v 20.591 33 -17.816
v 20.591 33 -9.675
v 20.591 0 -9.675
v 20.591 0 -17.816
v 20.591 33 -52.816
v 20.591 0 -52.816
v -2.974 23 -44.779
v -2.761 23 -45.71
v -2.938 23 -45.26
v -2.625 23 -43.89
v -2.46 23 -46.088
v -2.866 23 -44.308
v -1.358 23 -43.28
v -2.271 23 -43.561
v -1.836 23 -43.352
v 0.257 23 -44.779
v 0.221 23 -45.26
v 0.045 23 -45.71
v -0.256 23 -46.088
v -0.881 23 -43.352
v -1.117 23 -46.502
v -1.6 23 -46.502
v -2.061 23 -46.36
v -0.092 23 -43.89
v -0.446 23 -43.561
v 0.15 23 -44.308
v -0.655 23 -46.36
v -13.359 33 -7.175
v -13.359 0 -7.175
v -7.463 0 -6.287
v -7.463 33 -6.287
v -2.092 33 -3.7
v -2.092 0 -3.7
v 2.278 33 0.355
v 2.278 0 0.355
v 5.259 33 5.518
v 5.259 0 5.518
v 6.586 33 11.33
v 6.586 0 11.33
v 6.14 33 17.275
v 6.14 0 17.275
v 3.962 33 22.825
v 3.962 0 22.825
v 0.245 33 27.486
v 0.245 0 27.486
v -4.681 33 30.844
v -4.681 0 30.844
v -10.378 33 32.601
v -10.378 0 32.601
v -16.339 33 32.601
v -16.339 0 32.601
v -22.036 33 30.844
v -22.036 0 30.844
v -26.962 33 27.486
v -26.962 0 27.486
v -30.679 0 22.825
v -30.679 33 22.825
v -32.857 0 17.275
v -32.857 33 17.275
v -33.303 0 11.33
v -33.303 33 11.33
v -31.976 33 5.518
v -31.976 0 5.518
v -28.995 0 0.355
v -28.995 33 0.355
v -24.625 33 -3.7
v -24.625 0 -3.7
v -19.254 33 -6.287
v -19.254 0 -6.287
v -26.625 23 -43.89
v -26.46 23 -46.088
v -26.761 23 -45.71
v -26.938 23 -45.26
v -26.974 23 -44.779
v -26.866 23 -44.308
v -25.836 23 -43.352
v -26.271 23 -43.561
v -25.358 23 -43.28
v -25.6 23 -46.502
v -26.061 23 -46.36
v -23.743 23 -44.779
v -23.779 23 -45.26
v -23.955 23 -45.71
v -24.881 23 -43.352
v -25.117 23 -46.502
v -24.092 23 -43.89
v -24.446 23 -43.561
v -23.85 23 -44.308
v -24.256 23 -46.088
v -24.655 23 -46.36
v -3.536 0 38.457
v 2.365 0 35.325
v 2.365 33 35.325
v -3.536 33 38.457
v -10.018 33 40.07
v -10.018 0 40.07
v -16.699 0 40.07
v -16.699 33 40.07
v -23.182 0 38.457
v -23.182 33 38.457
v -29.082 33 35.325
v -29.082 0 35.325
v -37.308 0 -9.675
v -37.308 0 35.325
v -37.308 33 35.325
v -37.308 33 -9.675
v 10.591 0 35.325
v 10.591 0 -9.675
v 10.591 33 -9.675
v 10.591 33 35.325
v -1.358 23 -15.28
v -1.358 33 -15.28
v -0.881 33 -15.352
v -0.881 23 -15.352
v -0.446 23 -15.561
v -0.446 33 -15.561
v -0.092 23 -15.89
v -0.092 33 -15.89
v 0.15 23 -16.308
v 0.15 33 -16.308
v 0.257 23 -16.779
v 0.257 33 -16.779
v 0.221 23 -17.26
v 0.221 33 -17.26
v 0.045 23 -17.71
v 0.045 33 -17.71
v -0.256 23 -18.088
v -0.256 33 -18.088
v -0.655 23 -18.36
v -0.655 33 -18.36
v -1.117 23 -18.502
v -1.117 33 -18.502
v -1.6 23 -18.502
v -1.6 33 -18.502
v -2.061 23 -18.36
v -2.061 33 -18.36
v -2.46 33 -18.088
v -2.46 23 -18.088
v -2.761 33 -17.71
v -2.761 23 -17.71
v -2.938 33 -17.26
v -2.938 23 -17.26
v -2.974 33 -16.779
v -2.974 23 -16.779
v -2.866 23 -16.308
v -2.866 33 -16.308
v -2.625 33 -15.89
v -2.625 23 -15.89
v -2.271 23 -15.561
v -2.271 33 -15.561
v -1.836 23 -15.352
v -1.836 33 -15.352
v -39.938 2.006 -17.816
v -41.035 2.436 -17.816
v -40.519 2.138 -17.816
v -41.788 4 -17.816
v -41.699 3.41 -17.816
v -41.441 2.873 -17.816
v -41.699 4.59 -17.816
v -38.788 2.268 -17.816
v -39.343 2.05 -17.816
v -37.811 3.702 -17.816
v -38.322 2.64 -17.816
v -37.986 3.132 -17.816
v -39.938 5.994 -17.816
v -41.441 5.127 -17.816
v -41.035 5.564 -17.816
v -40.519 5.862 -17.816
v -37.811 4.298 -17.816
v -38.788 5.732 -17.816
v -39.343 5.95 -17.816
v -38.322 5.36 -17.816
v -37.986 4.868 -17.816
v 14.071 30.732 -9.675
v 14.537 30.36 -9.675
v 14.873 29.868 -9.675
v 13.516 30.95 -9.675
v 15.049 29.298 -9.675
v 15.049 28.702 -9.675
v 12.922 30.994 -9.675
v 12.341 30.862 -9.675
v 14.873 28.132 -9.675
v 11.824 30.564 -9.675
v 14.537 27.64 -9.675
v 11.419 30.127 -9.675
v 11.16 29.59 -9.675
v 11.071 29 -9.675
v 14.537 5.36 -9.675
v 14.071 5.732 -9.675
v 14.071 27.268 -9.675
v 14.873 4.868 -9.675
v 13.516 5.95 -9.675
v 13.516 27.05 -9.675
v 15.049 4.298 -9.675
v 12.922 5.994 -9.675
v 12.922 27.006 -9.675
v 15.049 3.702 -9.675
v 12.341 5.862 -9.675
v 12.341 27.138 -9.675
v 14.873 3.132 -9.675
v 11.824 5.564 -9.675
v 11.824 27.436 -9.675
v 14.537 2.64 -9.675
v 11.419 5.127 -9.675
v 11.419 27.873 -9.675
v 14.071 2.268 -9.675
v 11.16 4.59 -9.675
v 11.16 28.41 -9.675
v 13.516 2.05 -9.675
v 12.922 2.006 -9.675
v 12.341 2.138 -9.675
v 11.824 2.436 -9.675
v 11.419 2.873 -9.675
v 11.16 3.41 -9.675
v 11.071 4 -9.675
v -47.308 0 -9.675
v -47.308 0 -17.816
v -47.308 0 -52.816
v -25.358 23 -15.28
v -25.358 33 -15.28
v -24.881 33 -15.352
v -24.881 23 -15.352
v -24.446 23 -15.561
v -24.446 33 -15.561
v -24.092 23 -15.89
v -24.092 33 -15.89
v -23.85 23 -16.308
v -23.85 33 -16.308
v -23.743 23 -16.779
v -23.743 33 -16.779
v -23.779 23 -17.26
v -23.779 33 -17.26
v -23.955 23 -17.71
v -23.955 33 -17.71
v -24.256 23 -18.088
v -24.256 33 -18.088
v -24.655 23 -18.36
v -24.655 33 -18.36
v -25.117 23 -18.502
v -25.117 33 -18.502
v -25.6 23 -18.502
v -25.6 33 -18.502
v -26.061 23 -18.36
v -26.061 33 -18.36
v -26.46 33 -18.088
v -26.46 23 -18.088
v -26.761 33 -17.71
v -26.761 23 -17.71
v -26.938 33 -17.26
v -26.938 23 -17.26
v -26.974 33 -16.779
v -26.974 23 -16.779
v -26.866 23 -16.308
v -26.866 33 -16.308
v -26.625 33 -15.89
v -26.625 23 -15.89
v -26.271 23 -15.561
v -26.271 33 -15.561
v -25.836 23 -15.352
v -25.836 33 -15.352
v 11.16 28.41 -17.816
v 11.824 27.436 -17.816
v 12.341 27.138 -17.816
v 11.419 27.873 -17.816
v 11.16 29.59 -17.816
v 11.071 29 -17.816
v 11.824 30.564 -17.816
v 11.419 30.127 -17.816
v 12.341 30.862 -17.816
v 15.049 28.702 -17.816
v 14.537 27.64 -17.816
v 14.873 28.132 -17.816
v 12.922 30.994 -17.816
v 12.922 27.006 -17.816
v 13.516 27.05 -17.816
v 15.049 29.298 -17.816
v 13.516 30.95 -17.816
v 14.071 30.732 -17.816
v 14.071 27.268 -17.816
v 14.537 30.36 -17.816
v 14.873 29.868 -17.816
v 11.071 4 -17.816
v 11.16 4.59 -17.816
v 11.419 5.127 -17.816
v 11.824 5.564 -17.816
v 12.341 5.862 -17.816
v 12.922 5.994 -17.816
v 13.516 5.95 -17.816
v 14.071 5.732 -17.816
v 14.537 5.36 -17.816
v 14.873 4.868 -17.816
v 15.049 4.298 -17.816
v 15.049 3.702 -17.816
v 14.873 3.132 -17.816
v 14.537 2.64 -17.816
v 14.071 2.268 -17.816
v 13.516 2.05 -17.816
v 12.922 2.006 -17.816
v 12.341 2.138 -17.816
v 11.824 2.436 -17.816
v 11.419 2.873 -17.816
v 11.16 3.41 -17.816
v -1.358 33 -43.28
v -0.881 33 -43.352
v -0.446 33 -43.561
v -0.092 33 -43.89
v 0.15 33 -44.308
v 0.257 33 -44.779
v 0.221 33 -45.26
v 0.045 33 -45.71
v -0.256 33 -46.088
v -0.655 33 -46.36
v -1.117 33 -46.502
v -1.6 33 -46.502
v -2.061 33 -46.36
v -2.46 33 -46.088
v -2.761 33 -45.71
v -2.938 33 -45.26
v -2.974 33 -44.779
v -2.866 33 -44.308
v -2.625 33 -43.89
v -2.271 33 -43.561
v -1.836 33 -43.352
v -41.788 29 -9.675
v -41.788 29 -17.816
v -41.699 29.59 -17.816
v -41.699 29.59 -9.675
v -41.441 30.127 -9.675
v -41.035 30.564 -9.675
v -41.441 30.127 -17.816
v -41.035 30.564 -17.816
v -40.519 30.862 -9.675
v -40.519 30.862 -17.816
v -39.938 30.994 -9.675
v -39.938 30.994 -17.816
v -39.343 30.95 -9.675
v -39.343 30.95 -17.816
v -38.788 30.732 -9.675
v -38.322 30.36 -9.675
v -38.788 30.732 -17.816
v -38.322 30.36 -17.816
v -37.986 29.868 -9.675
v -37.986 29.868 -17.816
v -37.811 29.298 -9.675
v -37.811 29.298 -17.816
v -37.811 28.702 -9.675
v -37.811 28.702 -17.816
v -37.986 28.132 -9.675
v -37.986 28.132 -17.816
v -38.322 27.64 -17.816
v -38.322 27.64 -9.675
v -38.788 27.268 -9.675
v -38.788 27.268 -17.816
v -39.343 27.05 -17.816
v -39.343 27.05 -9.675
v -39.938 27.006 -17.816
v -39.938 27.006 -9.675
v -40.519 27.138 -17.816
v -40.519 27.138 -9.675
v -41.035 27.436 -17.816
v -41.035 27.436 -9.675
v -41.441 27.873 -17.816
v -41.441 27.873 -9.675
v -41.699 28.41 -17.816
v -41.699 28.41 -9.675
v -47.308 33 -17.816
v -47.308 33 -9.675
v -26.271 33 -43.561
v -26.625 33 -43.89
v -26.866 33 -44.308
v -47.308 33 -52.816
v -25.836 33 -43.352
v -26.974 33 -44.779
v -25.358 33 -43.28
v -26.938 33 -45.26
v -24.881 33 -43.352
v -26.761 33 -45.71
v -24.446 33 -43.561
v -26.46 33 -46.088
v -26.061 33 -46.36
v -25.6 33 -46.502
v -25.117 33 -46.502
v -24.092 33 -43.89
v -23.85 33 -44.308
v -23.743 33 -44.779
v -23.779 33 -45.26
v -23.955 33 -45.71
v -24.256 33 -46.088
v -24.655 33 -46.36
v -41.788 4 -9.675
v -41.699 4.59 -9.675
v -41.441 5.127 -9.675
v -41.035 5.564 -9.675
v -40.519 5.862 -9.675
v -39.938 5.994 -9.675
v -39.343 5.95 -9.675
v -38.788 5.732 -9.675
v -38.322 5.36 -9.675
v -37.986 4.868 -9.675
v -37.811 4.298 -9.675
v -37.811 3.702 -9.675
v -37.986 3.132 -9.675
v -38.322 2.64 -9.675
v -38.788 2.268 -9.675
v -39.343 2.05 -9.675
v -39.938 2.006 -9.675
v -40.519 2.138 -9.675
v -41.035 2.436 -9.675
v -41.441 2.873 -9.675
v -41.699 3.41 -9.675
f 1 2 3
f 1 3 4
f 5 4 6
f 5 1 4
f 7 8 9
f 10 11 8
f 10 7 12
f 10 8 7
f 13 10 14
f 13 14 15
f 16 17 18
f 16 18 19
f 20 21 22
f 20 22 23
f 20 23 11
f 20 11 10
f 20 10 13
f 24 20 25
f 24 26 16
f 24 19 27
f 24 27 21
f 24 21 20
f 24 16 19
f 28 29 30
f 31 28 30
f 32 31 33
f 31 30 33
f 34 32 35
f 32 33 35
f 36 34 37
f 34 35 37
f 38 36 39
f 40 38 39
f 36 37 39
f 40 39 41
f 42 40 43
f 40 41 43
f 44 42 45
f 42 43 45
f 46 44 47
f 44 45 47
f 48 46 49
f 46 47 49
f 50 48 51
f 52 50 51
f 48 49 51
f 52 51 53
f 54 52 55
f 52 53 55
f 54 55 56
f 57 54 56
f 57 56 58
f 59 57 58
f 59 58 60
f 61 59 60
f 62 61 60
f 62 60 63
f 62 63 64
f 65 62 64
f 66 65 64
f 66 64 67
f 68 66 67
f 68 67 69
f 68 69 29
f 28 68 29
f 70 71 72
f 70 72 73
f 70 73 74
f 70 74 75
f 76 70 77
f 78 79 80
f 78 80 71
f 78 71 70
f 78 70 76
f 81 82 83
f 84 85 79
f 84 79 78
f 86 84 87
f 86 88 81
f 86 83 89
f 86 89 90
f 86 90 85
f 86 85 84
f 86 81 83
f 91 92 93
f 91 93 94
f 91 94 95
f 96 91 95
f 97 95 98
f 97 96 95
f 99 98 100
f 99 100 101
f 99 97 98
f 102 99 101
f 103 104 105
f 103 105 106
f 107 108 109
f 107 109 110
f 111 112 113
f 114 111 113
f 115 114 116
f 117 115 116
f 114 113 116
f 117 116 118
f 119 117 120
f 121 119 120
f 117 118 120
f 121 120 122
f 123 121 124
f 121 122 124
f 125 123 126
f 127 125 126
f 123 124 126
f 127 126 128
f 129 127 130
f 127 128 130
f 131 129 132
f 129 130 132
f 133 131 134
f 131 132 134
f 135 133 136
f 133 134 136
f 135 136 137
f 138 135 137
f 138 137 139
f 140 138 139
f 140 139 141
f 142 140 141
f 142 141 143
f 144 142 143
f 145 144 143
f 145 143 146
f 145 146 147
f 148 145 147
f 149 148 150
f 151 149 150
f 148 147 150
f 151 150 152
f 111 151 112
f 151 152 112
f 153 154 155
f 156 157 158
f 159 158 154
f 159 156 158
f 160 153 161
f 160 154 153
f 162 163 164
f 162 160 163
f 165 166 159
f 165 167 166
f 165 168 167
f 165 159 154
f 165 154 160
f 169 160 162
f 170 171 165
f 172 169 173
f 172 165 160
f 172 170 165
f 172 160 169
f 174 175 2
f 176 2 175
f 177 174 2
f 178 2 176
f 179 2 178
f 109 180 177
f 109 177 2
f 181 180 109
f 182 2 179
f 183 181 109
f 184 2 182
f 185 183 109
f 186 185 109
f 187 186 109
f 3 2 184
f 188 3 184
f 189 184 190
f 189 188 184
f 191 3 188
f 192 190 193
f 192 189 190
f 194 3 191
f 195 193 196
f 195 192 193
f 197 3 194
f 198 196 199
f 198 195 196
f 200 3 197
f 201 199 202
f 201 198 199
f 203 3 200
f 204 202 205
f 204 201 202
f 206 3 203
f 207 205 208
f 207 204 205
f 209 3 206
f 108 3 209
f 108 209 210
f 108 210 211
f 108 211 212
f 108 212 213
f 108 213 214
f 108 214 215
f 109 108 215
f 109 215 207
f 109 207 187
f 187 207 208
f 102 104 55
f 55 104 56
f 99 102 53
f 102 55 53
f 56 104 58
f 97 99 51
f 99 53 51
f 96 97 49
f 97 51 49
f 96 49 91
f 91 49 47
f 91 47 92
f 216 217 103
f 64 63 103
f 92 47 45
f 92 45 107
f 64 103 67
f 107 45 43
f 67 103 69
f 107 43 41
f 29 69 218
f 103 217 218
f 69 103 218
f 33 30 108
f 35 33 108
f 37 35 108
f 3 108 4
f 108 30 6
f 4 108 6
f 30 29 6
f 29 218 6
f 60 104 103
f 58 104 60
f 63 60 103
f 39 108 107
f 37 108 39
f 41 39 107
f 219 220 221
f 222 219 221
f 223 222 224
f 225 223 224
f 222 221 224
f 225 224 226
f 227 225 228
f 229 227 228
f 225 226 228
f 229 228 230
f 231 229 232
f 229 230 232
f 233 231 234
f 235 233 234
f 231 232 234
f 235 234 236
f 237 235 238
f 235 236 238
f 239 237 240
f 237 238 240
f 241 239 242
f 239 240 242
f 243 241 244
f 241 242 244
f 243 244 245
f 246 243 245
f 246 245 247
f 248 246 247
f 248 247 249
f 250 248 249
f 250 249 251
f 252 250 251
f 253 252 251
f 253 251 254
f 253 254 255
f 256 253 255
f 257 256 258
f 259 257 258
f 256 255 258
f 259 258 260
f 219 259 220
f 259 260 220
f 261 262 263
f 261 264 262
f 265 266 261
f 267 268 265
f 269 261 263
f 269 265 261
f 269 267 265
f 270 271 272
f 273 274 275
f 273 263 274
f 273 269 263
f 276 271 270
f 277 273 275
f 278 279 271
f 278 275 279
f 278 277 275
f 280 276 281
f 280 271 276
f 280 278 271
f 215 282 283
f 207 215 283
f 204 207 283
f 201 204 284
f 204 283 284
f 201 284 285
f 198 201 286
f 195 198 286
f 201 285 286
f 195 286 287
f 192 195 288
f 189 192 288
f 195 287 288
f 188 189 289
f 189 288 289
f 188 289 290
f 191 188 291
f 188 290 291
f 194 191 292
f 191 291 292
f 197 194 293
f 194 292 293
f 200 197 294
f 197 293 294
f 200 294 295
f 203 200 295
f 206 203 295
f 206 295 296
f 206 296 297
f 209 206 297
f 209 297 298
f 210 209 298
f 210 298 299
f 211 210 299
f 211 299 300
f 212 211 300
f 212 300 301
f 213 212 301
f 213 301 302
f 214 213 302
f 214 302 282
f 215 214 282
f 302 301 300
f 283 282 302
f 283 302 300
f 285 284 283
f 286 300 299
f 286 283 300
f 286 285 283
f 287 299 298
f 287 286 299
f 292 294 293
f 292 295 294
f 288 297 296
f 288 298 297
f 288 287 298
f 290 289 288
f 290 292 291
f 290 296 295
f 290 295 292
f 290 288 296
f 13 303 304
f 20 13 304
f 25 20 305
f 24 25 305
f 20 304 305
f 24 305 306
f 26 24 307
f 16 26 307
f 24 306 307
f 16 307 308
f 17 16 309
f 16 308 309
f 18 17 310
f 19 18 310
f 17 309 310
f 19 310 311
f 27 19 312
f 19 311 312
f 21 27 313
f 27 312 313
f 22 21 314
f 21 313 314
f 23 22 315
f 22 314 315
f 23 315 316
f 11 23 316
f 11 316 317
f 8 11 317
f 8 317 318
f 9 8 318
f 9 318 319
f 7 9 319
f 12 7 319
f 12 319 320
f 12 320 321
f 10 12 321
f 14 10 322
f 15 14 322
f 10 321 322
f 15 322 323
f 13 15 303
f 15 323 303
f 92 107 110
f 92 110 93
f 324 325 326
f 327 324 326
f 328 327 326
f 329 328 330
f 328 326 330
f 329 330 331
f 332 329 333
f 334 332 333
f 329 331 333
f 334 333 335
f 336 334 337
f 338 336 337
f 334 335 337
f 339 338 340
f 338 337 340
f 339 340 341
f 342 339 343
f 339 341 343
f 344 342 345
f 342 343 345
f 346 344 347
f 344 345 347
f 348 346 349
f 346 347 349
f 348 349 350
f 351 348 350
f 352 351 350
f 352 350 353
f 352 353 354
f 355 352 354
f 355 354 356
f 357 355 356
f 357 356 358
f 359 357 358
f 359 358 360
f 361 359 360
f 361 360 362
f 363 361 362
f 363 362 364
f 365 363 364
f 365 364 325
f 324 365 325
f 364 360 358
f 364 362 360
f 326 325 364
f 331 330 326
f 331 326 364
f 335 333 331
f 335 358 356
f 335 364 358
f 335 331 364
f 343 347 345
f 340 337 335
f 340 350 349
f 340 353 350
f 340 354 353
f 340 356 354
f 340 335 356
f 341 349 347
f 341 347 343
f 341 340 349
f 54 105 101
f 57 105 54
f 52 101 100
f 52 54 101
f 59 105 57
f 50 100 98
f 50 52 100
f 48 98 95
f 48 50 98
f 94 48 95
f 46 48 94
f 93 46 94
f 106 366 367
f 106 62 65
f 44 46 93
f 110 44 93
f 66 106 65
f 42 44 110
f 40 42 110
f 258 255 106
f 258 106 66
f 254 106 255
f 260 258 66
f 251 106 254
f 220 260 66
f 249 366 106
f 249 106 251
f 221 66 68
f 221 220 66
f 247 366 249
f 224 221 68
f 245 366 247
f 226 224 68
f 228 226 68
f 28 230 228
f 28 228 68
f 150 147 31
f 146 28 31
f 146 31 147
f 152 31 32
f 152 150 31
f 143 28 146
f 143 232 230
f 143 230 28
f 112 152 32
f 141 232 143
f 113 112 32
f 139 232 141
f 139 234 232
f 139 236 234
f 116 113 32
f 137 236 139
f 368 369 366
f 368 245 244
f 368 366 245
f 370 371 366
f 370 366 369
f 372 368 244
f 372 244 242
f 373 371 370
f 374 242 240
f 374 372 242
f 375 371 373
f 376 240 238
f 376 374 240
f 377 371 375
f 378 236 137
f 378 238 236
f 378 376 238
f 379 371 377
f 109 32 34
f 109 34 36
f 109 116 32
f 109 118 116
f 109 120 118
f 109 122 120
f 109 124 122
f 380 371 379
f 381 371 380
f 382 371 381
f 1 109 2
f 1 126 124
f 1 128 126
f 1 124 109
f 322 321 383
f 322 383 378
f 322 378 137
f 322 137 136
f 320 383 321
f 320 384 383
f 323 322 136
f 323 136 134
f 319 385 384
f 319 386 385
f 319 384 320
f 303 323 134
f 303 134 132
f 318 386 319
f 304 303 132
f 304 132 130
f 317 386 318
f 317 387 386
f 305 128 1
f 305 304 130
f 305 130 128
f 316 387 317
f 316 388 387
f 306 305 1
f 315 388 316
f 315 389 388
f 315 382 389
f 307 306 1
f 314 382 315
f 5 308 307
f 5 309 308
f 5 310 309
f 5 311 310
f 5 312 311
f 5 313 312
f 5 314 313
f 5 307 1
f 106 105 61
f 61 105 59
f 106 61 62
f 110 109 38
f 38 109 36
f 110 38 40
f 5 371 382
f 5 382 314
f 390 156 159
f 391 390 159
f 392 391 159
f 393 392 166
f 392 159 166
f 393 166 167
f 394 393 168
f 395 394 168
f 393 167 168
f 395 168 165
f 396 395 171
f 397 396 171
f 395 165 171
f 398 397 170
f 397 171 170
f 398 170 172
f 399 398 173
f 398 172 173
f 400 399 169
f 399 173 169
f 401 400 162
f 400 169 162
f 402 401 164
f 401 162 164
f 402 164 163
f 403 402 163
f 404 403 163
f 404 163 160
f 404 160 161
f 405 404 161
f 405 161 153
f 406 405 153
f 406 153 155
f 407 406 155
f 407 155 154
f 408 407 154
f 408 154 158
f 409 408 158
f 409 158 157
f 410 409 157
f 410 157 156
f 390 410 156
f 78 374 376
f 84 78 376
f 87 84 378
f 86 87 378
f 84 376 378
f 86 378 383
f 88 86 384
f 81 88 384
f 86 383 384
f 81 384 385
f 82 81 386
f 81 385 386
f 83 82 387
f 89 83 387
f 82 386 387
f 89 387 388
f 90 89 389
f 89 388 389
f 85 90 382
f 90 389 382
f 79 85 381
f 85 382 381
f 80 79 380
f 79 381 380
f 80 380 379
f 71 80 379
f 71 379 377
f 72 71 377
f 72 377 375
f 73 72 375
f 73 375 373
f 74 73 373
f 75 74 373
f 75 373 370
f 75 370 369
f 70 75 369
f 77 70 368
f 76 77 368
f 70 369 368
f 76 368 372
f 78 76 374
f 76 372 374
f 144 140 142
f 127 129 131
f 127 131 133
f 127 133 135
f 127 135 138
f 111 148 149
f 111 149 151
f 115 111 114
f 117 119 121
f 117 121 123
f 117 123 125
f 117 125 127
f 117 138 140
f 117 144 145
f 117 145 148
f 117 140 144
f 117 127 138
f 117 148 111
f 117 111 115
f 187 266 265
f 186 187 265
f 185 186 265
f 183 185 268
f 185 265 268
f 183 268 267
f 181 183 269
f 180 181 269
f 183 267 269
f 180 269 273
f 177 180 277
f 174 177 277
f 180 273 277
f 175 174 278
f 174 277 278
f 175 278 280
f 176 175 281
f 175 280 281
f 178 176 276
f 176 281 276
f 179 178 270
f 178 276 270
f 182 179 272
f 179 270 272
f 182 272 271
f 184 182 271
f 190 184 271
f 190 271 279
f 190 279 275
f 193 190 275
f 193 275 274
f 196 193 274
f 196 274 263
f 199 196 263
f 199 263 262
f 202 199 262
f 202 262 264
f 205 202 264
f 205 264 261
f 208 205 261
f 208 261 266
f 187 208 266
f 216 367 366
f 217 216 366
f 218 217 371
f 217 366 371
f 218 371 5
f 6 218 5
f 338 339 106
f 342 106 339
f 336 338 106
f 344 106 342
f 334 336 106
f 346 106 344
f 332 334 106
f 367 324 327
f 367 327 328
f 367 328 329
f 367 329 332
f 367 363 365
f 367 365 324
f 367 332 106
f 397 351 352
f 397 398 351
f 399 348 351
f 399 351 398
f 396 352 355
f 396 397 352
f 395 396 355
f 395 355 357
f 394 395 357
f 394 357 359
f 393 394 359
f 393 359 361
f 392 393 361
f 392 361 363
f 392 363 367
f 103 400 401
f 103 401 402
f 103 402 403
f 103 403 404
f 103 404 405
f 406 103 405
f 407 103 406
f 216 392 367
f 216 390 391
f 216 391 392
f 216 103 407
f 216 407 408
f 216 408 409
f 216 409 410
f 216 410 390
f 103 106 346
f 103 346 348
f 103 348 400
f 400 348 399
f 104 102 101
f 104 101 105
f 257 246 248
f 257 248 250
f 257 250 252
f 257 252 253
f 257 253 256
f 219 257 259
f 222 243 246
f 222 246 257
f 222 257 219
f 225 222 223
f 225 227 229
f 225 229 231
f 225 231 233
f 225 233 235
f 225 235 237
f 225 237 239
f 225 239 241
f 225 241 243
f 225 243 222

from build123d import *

# Parameters (mm, degrees)
SKETCH1_R           = 18
BOSS_EXTRUDE3_DEPTH = 33
SKETCH12_R          = 2
CUT_EXTRUDE1_DEPTH  = 10
SKETCH13_W          = 67.899494937
SKETCH13_H          = 35
BOSS_EXTRUDE4_DEPTH = 33
SKETCH14_R          = 1.62
CUT_EXTRUDE2_DEPTH  = 10
SKETCH15_R          = 20
CUT_EXTRUDE3_DEPTH  = 79.208702146


with BuildPart() as part:
    # Sketch1 → Boss-Extrude3 (new body)
    with BuildSketch(Plane(origin=(0, 0, 0), x_dir=(1, 0, 0), z_dir=(0, 1, 0))):
        with BuildLine():
            Line((-47.308295415, 17.815966111), (20.591199522, 17.815966111))
            Line((20.591199522, 17.815966111), (20.591199522, 9.675262593))
            Line((20.591199522, 9.675262593), (10.591199522, 9.675262593))
            Line((10.591199522, 9.675262593), (10.591199522, -35.324737407))
            Line((10.591199522, -35.324737407), (2.365275891, -35.324737407))
            ThreePointArc((2.365275891, -35.324737407), (-13.358547947, -40.274484875), (-29.082371784, -35.324737407))
            Line((-29.082371784, -35.324737407), (-37.308295415, -35.324737407))
            Line((-37.308295415, -35.324737407), (-37.308295415, 9.675262593))
            Line((-37.308295415, 9.675262593), (-47.308295415, 9.675262593))
            Line((-47.308295415, 9.675262593), (-47.308295415, 17.815966111))
        make_face()
        with Locations(Location((-13.358547947, -12.824737407, 0), (0, 0, 270))):
            Circle(SKETCH1_R, mode=Mode.SUBTRACT)
    extrude(amount=BOSS_EXTRUDE3_DEPTH)

    # Sketch12 → Cut-Extrude1 (cut)
    with BuildSketch(Plane(origin=(0, 0, -17.815966111), x_dir=(-1, 0, 0), z_dir=(0, 0, -1))):
        with Locations((39.788295415, 4)):
            Circle(SKETCH12_R)
        with Locations((39.788295415, 29)):
            Circle(SKETCH12_R)
        with Locations((-13.071199522, 29)):
            Circle(SKETCH12_R)
        with Locations((-13.071199522, 4)):
            Circle(SKETCH12_R)
    extrude(amount=-CUT_EXTRUDE1_DEPTH, mode=Mode.SUBTRACT)

    # Sketch13 → Boss-Extrude4 (add)
    with BuildSketch(Plane(origin=(0, 33, 0), x_dir=(1, 0, 0), z_dir=(0, 1, 0))):
        with Locations((-13.358547947, 35.315966111)):
            Rectangle(SKETCH13_W, SKETCH13_H)
    extrude(amount=-BOSS_EXTRUDE4_DEPTH)

    # Sketch14 → Cut-Extrude2 (cut)
    with BuildSketch(Plane(origin=(0, 33, 0), x_dir=(1, 0, 0), z_dir=(0, 1, 0))):
        with Locations(Location((-25.358295415, 16.899970921, 0), (0, 0, 270))):
            Circle(SKETCH14_R)
        with Locations(Location((-1.358295415, 16.899970921, 0), (0, 0, 270))):
            Circle(SKETCH14_R)
        with Locations(Location((-25.358295415, 44.899970921, 0), (0, 0, 270))):
            Circle(SKETCH14_R)
        with Locations(Location((-1.358295415, 44.899970921, 0), (0, 0, 270))):
            Circle(SKETCH14_R)
    extrude(amount=-CUT_EXTRUDE2_DEPTH, mode=Mode.SUBTRACT)

    # Sketch15 → Cut-Extrude3 (cut, through all)
    with BuildSketch(Plane.XZ):
        with Locations(Location((-13.358547947, 12.824737407, 0), (0, 0, 270))):
            Circle(SKETCH15_R)
    extrude(amount=-CUT_EXTRUDE3_DEPTH, mode=Mode.SUBTRACT)


solid = part.part
